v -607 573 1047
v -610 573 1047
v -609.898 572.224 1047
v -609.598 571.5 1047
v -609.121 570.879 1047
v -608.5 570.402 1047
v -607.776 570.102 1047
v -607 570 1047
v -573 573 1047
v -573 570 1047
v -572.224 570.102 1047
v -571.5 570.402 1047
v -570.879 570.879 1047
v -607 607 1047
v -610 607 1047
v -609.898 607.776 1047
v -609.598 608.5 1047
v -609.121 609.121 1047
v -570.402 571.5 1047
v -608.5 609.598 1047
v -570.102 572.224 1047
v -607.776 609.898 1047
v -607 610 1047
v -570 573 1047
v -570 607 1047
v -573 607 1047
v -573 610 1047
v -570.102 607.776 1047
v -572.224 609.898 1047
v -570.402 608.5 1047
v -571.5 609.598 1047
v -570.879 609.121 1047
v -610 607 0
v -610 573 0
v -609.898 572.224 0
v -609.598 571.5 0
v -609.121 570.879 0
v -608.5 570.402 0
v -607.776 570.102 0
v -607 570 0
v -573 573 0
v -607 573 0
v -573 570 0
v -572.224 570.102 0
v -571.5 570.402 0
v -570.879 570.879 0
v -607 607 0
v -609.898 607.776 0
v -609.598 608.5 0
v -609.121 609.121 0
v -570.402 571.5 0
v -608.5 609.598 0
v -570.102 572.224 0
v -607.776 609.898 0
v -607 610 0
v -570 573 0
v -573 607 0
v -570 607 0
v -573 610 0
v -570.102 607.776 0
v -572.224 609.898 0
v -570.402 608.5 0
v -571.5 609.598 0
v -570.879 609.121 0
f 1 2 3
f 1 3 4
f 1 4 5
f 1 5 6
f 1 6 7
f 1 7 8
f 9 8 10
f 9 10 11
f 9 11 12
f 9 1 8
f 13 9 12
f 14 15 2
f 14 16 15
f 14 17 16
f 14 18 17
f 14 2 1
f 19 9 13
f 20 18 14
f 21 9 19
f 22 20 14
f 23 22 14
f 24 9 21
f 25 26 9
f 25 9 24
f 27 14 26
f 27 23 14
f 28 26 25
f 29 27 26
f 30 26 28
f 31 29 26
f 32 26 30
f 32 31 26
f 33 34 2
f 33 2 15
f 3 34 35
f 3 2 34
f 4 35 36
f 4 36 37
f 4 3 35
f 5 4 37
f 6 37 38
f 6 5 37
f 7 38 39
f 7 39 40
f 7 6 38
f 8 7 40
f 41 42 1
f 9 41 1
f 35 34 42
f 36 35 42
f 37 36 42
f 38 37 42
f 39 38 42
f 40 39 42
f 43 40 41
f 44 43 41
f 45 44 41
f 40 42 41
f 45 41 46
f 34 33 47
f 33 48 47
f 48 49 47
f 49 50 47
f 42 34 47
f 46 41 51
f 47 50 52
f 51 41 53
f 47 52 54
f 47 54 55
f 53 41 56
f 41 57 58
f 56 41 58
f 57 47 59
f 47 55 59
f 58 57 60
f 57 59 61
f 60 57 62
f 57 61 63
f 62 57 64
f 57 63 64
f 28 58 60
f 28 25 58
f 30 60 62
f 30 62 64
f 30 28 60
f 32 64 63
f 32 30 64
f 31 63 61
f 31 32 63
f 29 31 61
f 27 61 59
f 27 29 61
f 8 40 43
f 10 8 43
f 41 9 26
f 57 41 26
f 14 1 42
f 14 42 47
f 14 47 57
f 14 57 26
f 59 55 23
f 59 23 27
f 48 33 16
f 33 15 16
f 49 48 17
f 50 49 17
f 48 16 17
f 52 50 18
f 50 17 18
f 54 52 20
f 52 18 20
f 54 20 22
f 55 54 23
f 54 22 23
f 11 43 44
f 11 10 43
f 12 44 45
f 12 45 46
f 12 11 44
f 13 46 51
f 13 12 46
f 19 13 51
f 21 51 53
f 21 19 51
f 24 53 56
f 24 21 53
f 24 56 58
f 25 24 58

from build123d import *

# Parameters (mm, degrees)
SKETCH1_W           = 40
SKETCH1_H           = 40
BOSS_EXTRUDE1_DEPTH = 1047
FILLET1_R           = 3
SHELL1_START        = -607
SHELL1_OUTLINE_W    = 34
SHELL1_OUTLINE_H    = 1047
SHELL1_DEPTH        = 34


# Read off the part's stored shape, not the designer's step: Shell1
with BuildPart() as part:
    # Sketch1 → Boss-Extrude1 (new body)
    with BuildSketch(Plane.XY):
        with Locations((-590, 590)):
            Rectangle(SKETCH1_W, SKETCH1_H)
    extrude(amount=BOSS_EXTRUDE1_DEPTH)

    # Fillet1
    fillet1_edges = [part.edges().sort_by_distance(p)[0] for p in [
        (-610, 570, 523.5),
        (-570, 570, 523.5),
        (-570, 610, 523.5),
        (-610, 610, 523.5),
    ]]
    fillet(fillet1_edges, radius=FILLET1_R)

    # Shell1 outline → Shell1 (cut)
    with BuildSketch(Plane.YZ.offset(SHELL1_START)):
        with Locations((590, 523.5)):
            Rectangle(SHELL1_OUTLINE_W, SHELL1_OUTLINE_H)
    extrude(amount=SHELL1_DEPTH, mode=Mode.SUBTRACT)


solid = part.part
